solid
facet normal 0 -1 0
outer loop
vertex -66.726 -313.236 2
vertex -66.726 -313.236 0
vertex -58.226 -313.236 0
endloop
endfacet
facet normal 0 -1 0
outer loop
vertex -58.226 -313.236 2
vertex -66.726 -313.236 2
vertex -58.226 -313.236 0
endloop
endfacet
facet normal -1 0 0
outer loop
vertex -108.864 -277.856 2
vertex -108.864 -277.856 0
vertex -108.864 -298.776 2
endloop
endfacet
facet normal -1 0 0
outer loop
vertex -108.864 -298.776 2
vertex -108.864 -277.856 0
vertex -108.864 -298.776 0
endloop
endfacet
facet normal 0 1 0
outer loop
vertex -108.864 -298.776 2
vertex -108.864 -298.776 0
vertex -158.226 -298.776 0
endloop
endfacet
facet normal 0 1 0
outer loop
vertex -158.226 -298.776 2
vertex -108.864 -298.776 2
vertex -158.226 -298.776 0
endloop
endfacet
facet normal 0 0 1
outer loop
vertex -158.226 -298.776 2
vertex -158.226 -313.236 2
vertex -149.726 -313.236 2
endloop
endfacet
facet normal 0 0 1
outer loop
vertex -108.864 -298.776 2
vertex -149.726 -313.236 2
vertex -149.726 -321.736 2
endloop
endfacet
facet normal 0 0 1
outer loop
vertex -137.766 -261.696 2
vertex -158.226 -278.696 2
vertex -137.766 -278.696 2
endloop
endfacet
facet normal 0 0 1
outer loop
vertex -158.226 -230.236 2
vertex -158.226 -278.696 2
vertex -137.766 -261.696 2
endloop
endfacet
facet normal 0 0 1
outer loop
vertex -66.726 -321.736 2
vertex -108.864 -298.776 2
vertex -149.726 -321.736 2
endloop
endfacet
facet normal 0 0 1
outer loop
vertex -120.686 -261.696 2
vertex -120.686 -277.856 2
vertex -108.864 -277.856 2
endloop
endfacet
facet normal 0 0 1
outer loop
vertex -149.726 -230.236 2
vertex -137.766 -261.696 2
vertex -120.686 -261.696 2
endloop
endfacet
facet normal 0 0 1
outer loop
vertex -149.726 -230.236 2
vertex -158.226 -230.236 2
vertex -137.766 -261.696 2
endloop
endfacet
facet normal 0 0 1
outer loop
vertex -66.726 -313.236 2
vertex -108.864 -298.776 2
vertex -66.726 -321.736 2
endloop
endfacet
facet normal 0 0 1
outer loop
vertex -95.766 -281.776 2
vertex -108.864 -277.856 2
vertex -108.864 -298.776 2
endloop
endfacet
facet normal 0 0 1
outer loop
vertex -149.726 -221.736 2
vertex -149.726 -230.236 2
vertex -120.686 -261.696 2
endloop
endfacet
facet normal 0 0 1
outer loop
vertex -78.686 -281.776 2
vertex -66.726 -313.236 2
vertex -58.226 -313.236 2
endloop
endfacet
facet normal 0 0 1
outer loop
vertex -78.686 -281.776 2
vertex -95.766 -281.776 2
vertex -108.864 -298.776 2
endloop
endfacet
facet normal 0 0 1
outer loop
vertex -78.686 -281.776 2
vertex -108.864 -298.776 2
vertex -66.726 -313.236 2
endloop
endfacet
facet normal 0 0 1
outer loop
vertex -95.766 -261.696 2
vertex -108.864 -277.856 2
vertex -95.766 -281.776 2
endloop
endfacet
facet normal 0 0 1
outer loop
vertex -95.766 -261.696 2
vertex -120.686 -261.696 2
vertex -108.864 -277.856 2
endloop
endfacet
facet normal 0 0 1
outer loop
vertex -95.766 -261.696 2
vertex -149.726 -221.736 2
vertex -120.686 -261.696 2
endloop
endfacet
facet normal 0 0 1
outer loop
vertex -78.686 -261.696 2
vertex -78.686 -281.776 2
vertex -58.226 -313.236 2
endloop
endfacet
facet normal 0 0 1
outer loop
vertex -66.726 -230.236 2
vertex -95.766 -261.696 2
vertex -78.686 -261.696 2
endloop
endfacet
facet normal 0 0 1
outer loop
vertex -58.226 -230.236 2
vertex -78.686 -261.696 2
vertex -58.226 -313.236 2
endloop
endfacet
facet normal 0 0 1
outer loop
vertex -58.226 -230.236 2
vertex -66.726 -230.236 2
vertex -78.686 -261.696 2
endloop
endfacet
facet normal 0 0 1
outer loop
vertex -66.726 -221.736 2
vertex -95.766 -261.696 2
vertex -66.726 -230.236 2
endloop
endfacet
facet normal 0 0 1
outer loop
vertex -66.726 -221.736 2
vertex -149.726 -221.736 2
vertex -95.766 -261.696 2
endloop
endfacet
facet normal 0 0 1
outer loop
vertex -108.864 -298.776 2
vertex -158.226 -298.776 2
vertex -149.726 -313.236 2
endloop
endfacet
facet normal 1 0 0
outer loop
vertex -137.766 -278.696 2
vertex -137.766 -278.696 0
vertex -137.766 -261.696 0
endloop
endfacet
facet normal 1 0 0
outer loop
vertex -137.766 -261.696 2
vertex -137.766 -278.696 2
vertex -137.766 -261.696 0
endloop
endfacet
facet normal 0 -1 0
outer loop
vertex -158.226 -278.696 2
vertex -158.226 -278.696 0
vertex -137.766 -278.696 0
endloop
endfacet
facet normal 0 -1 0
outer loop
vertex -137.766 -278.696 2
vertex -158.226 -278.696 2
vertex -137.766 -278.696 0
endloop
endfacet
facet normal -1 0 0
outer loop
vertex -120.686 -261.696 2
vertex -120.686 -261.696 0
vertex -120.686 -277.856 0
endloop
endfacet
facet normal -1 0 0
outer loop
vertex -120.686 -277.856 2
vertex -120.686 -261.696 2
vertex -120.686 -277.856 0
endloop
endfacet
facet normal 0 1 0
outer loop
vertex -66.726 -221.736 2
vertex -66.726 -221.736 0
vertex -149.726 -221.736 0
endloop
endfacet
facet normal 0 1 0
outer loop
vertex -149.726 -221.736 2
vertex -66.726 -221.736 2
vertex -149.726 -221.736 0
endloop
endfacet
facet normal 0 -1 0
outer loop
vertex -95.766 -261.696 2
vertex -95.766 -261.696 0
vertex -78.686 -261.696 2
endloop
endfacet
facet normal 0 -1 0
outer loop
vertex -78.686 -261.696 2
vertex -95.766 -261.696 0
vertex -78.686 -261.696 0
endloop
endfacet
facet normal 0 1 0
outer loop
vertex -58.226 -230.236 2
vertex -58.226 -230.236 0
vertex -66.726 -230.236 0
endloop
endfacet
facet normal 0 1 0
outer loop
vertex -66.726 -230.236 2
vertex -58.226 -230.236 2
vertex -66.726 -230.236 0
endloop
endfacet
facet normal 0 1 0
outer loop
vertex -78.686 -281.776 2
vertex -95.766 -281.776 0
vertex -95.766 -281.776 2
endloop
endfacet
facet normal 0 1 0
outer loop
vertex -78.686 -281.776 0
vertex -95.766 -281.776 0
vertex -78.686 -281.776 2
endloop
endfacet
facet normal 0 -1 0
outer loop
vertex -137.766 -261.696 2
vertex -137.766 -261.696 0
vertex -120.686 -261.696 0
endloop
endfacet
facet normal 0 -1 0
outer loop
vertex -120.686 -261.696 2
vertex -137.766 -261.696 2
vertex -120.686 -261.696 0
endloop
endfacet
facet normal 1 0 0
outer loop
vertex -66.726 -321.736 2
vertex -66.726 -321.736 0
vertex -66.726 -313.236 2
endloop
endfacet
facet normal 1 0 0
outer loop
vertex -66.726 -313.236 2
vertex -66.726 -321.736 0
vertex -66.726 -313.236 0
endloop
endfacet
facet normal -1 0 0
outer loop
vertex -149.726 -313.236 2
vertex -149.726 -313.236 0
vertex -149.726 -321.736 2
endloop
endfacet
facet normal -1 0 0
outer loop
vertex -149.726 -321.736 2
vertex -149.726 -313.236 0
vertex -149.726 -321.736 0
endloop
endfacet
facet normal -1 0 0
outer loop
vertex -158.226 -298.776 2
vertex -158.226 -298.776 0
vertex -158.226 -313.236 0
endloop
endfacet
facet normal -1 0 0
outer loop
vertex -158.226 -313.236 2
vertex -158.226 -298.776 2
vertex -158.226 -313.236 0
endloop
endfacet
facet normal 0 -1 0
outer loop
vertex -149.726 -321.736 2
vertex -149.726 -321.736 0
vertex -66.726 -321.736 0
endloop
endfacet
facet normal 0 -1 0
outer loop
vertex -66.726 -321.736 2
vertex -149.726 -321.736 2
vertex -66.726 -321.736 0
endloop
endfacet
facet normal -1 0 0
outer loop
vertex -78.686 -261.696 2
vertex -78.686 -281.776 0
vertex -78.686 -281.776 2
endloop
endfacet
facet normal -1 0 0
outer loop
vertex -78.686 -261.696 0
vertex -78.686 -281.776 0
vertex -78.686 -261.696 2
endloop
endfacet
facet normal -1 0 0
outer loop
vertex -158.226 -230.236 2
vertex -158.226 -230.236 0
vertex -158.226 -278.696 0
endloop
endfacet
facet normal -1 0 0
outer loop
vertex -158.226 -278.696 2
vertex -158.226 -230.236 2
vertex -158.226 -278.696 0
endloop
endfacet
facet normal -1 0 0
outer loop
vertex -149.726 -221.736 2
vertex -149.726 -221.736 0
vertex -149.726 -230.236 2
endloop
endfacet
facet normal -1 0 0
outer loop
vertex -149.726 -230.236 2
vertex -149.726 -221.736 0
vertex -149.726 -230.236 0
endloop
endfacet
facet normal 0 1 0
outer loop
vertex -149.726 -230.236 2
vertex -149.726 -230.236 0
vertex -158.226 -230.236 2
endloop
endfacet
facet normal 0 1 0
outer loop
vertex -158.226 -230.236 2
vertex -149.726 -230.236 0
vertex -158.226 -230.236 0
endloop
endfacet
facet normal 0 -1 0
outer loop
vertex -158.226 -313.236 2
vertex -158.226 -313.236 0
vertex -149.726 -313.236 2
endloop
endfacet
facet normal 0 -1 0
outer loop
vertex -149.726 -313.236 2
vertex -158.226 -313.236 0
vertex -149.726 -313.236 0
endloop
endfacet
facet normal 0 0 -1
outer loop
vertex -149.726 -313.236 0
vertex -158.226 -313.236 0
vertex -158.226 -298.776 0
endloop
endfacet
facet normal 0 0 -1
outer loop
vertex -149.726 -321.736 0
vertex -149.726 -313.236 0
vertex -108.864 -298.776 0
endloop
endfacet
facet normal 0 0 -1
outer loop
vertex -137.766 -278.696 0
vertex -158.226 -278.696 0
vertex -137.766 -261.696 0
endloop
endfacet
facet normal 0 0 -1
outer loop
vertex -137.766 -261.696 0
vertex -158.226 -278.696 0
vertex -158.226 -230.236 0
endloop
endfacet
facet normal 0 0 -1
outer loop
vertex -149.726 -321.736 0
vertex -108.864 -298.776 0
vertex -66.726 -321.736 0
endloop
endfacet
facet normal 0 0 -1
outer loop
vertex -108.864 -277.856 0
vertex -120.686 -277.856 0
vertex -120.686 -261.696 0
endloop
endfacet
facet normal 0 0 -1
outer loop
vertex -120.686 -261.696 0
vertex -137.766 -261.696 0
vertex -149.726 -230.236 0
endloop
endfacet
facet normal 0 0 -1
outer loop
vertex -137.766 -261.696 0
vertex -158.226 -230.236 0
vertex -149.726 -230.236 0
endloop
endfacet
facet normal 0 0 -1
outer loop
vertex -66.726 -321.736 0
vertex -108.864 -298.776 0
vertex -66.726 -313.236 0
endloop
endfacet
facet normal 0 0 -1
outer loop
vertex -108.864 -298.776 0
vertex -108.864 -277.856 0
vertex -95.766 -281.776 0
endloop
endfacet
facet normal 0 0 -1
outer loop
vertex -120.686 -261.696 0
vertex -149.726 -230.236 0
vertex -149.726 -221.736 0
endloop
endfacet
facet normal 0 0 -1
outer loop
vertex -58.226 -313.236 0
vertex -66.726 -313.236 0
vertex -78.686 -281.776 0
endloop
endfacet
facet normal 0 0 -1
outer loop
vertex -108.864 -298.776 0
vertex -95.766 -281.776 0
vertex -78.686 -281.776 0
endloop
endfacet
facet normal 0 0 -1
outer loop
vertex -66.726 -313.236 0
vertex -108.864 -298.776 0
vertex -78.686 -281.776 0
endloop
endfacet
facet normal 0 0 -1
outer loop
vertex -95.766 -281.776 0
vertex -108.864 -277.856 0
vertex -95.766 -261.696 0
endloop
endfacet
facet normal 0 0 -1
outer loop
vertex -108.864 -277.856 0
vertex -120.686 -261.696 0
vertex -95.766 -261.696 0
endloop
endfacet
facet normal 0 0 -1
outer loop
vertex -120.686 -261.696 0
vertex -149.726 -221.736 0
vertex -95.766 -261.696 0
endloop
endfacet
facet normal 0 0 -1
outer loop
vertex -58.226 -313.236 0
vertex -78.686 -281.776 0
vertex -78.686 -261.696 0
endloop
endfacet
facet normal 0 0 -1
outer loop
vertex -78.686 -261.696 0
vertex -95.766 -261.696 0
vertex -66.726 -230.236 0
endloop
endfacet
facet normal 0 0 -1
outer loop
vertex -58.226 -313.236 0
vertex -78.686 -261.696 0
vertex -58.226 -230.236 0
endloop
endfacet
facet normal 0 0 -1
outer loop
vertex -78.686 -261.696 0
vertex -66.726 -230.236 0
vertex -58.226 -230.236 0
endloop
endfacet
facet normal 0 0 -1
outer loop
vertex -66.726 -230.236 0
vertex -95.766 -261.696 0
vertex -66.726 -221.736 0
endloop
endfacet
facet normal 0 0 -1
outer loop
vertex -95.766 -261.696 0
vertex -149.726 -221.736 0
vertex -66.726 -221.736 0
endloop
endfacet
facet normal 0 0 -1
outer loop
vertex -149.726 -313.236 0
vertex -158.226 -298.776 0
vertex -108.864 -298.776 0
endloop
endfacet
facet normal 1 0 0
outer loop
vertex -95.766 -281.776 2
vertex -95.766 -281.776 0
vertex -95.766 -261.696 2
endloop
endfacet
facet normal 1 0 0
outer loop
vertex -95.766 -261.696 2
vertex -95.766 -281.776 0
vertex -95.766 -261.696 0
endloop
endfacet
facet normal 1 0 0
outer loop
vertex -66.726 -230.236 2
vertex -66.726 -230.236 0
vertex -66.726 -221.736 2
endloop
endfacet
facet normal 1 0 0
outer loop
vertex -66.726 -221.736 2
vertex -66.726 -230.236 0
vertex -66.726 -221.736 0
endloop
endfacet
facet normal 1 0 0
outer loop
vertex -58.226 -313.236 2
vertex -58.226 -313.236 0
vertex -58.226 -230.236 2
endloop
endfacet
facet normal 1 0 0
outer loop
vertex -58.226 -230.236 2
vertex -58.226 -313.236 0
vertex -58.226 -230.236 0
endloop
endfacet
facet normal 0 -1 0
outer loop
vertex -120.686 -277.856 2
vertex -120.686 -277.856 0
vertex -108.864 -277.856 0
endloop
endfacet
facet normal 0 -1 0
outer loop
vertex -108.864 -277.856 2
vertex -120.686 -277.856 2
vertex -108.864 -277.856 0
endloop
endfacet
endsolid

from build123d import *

# Parameters (mm, degrees)
SKETCH1_W           = 17.080006479
SKETCH1_H           = 20.0800081
BOSS_EXTRUDE1_DEPTH = 2


with BuildPart() as part:
    # Sketch1 → Boss-Extrude1 (new body)
    with BuildSketch(Plane.XY):
        Polygon((-158.225691519, -298.776294453), (-158.225691519, -313.236290403), (-149.725691519, -313.236290403), (-149.725691519, -321.736290403), (-66.725691519, -321.736290403), (-66.725691519, -313.236290403), (-58.225691519, -313.236290403), (-58.225691519, -230.236290403), (-66.725691519, -230.236290403), (-66.725691519, -221.736290403), (-149.725691519, -221.736290403), (-149.725691519, -230.236290403), (-158.225691519, -230.236290403), (-158.225691519, -278.696286353), (-137.765694759, -278.696286353), (-137.765694759, -261.696286353), (-120.68568828, -261.696286353), (-120.68568828, -277.85605527), (-108.863916488, -277.85605527), (-108.863916488, -281.776294453), (-108.863916488, -298.776294453), (-122.185689089, -298.776294453), align=None)
        with Locations((-87.225691519, -271.736290403)):
            Rectangle(SKETCH1_W, SKETCH1_H, mode=Mode.SUBTRACT)
    extrude(amount=BOSS_EXTRUDE1_DEPTH)


solid = part.part
